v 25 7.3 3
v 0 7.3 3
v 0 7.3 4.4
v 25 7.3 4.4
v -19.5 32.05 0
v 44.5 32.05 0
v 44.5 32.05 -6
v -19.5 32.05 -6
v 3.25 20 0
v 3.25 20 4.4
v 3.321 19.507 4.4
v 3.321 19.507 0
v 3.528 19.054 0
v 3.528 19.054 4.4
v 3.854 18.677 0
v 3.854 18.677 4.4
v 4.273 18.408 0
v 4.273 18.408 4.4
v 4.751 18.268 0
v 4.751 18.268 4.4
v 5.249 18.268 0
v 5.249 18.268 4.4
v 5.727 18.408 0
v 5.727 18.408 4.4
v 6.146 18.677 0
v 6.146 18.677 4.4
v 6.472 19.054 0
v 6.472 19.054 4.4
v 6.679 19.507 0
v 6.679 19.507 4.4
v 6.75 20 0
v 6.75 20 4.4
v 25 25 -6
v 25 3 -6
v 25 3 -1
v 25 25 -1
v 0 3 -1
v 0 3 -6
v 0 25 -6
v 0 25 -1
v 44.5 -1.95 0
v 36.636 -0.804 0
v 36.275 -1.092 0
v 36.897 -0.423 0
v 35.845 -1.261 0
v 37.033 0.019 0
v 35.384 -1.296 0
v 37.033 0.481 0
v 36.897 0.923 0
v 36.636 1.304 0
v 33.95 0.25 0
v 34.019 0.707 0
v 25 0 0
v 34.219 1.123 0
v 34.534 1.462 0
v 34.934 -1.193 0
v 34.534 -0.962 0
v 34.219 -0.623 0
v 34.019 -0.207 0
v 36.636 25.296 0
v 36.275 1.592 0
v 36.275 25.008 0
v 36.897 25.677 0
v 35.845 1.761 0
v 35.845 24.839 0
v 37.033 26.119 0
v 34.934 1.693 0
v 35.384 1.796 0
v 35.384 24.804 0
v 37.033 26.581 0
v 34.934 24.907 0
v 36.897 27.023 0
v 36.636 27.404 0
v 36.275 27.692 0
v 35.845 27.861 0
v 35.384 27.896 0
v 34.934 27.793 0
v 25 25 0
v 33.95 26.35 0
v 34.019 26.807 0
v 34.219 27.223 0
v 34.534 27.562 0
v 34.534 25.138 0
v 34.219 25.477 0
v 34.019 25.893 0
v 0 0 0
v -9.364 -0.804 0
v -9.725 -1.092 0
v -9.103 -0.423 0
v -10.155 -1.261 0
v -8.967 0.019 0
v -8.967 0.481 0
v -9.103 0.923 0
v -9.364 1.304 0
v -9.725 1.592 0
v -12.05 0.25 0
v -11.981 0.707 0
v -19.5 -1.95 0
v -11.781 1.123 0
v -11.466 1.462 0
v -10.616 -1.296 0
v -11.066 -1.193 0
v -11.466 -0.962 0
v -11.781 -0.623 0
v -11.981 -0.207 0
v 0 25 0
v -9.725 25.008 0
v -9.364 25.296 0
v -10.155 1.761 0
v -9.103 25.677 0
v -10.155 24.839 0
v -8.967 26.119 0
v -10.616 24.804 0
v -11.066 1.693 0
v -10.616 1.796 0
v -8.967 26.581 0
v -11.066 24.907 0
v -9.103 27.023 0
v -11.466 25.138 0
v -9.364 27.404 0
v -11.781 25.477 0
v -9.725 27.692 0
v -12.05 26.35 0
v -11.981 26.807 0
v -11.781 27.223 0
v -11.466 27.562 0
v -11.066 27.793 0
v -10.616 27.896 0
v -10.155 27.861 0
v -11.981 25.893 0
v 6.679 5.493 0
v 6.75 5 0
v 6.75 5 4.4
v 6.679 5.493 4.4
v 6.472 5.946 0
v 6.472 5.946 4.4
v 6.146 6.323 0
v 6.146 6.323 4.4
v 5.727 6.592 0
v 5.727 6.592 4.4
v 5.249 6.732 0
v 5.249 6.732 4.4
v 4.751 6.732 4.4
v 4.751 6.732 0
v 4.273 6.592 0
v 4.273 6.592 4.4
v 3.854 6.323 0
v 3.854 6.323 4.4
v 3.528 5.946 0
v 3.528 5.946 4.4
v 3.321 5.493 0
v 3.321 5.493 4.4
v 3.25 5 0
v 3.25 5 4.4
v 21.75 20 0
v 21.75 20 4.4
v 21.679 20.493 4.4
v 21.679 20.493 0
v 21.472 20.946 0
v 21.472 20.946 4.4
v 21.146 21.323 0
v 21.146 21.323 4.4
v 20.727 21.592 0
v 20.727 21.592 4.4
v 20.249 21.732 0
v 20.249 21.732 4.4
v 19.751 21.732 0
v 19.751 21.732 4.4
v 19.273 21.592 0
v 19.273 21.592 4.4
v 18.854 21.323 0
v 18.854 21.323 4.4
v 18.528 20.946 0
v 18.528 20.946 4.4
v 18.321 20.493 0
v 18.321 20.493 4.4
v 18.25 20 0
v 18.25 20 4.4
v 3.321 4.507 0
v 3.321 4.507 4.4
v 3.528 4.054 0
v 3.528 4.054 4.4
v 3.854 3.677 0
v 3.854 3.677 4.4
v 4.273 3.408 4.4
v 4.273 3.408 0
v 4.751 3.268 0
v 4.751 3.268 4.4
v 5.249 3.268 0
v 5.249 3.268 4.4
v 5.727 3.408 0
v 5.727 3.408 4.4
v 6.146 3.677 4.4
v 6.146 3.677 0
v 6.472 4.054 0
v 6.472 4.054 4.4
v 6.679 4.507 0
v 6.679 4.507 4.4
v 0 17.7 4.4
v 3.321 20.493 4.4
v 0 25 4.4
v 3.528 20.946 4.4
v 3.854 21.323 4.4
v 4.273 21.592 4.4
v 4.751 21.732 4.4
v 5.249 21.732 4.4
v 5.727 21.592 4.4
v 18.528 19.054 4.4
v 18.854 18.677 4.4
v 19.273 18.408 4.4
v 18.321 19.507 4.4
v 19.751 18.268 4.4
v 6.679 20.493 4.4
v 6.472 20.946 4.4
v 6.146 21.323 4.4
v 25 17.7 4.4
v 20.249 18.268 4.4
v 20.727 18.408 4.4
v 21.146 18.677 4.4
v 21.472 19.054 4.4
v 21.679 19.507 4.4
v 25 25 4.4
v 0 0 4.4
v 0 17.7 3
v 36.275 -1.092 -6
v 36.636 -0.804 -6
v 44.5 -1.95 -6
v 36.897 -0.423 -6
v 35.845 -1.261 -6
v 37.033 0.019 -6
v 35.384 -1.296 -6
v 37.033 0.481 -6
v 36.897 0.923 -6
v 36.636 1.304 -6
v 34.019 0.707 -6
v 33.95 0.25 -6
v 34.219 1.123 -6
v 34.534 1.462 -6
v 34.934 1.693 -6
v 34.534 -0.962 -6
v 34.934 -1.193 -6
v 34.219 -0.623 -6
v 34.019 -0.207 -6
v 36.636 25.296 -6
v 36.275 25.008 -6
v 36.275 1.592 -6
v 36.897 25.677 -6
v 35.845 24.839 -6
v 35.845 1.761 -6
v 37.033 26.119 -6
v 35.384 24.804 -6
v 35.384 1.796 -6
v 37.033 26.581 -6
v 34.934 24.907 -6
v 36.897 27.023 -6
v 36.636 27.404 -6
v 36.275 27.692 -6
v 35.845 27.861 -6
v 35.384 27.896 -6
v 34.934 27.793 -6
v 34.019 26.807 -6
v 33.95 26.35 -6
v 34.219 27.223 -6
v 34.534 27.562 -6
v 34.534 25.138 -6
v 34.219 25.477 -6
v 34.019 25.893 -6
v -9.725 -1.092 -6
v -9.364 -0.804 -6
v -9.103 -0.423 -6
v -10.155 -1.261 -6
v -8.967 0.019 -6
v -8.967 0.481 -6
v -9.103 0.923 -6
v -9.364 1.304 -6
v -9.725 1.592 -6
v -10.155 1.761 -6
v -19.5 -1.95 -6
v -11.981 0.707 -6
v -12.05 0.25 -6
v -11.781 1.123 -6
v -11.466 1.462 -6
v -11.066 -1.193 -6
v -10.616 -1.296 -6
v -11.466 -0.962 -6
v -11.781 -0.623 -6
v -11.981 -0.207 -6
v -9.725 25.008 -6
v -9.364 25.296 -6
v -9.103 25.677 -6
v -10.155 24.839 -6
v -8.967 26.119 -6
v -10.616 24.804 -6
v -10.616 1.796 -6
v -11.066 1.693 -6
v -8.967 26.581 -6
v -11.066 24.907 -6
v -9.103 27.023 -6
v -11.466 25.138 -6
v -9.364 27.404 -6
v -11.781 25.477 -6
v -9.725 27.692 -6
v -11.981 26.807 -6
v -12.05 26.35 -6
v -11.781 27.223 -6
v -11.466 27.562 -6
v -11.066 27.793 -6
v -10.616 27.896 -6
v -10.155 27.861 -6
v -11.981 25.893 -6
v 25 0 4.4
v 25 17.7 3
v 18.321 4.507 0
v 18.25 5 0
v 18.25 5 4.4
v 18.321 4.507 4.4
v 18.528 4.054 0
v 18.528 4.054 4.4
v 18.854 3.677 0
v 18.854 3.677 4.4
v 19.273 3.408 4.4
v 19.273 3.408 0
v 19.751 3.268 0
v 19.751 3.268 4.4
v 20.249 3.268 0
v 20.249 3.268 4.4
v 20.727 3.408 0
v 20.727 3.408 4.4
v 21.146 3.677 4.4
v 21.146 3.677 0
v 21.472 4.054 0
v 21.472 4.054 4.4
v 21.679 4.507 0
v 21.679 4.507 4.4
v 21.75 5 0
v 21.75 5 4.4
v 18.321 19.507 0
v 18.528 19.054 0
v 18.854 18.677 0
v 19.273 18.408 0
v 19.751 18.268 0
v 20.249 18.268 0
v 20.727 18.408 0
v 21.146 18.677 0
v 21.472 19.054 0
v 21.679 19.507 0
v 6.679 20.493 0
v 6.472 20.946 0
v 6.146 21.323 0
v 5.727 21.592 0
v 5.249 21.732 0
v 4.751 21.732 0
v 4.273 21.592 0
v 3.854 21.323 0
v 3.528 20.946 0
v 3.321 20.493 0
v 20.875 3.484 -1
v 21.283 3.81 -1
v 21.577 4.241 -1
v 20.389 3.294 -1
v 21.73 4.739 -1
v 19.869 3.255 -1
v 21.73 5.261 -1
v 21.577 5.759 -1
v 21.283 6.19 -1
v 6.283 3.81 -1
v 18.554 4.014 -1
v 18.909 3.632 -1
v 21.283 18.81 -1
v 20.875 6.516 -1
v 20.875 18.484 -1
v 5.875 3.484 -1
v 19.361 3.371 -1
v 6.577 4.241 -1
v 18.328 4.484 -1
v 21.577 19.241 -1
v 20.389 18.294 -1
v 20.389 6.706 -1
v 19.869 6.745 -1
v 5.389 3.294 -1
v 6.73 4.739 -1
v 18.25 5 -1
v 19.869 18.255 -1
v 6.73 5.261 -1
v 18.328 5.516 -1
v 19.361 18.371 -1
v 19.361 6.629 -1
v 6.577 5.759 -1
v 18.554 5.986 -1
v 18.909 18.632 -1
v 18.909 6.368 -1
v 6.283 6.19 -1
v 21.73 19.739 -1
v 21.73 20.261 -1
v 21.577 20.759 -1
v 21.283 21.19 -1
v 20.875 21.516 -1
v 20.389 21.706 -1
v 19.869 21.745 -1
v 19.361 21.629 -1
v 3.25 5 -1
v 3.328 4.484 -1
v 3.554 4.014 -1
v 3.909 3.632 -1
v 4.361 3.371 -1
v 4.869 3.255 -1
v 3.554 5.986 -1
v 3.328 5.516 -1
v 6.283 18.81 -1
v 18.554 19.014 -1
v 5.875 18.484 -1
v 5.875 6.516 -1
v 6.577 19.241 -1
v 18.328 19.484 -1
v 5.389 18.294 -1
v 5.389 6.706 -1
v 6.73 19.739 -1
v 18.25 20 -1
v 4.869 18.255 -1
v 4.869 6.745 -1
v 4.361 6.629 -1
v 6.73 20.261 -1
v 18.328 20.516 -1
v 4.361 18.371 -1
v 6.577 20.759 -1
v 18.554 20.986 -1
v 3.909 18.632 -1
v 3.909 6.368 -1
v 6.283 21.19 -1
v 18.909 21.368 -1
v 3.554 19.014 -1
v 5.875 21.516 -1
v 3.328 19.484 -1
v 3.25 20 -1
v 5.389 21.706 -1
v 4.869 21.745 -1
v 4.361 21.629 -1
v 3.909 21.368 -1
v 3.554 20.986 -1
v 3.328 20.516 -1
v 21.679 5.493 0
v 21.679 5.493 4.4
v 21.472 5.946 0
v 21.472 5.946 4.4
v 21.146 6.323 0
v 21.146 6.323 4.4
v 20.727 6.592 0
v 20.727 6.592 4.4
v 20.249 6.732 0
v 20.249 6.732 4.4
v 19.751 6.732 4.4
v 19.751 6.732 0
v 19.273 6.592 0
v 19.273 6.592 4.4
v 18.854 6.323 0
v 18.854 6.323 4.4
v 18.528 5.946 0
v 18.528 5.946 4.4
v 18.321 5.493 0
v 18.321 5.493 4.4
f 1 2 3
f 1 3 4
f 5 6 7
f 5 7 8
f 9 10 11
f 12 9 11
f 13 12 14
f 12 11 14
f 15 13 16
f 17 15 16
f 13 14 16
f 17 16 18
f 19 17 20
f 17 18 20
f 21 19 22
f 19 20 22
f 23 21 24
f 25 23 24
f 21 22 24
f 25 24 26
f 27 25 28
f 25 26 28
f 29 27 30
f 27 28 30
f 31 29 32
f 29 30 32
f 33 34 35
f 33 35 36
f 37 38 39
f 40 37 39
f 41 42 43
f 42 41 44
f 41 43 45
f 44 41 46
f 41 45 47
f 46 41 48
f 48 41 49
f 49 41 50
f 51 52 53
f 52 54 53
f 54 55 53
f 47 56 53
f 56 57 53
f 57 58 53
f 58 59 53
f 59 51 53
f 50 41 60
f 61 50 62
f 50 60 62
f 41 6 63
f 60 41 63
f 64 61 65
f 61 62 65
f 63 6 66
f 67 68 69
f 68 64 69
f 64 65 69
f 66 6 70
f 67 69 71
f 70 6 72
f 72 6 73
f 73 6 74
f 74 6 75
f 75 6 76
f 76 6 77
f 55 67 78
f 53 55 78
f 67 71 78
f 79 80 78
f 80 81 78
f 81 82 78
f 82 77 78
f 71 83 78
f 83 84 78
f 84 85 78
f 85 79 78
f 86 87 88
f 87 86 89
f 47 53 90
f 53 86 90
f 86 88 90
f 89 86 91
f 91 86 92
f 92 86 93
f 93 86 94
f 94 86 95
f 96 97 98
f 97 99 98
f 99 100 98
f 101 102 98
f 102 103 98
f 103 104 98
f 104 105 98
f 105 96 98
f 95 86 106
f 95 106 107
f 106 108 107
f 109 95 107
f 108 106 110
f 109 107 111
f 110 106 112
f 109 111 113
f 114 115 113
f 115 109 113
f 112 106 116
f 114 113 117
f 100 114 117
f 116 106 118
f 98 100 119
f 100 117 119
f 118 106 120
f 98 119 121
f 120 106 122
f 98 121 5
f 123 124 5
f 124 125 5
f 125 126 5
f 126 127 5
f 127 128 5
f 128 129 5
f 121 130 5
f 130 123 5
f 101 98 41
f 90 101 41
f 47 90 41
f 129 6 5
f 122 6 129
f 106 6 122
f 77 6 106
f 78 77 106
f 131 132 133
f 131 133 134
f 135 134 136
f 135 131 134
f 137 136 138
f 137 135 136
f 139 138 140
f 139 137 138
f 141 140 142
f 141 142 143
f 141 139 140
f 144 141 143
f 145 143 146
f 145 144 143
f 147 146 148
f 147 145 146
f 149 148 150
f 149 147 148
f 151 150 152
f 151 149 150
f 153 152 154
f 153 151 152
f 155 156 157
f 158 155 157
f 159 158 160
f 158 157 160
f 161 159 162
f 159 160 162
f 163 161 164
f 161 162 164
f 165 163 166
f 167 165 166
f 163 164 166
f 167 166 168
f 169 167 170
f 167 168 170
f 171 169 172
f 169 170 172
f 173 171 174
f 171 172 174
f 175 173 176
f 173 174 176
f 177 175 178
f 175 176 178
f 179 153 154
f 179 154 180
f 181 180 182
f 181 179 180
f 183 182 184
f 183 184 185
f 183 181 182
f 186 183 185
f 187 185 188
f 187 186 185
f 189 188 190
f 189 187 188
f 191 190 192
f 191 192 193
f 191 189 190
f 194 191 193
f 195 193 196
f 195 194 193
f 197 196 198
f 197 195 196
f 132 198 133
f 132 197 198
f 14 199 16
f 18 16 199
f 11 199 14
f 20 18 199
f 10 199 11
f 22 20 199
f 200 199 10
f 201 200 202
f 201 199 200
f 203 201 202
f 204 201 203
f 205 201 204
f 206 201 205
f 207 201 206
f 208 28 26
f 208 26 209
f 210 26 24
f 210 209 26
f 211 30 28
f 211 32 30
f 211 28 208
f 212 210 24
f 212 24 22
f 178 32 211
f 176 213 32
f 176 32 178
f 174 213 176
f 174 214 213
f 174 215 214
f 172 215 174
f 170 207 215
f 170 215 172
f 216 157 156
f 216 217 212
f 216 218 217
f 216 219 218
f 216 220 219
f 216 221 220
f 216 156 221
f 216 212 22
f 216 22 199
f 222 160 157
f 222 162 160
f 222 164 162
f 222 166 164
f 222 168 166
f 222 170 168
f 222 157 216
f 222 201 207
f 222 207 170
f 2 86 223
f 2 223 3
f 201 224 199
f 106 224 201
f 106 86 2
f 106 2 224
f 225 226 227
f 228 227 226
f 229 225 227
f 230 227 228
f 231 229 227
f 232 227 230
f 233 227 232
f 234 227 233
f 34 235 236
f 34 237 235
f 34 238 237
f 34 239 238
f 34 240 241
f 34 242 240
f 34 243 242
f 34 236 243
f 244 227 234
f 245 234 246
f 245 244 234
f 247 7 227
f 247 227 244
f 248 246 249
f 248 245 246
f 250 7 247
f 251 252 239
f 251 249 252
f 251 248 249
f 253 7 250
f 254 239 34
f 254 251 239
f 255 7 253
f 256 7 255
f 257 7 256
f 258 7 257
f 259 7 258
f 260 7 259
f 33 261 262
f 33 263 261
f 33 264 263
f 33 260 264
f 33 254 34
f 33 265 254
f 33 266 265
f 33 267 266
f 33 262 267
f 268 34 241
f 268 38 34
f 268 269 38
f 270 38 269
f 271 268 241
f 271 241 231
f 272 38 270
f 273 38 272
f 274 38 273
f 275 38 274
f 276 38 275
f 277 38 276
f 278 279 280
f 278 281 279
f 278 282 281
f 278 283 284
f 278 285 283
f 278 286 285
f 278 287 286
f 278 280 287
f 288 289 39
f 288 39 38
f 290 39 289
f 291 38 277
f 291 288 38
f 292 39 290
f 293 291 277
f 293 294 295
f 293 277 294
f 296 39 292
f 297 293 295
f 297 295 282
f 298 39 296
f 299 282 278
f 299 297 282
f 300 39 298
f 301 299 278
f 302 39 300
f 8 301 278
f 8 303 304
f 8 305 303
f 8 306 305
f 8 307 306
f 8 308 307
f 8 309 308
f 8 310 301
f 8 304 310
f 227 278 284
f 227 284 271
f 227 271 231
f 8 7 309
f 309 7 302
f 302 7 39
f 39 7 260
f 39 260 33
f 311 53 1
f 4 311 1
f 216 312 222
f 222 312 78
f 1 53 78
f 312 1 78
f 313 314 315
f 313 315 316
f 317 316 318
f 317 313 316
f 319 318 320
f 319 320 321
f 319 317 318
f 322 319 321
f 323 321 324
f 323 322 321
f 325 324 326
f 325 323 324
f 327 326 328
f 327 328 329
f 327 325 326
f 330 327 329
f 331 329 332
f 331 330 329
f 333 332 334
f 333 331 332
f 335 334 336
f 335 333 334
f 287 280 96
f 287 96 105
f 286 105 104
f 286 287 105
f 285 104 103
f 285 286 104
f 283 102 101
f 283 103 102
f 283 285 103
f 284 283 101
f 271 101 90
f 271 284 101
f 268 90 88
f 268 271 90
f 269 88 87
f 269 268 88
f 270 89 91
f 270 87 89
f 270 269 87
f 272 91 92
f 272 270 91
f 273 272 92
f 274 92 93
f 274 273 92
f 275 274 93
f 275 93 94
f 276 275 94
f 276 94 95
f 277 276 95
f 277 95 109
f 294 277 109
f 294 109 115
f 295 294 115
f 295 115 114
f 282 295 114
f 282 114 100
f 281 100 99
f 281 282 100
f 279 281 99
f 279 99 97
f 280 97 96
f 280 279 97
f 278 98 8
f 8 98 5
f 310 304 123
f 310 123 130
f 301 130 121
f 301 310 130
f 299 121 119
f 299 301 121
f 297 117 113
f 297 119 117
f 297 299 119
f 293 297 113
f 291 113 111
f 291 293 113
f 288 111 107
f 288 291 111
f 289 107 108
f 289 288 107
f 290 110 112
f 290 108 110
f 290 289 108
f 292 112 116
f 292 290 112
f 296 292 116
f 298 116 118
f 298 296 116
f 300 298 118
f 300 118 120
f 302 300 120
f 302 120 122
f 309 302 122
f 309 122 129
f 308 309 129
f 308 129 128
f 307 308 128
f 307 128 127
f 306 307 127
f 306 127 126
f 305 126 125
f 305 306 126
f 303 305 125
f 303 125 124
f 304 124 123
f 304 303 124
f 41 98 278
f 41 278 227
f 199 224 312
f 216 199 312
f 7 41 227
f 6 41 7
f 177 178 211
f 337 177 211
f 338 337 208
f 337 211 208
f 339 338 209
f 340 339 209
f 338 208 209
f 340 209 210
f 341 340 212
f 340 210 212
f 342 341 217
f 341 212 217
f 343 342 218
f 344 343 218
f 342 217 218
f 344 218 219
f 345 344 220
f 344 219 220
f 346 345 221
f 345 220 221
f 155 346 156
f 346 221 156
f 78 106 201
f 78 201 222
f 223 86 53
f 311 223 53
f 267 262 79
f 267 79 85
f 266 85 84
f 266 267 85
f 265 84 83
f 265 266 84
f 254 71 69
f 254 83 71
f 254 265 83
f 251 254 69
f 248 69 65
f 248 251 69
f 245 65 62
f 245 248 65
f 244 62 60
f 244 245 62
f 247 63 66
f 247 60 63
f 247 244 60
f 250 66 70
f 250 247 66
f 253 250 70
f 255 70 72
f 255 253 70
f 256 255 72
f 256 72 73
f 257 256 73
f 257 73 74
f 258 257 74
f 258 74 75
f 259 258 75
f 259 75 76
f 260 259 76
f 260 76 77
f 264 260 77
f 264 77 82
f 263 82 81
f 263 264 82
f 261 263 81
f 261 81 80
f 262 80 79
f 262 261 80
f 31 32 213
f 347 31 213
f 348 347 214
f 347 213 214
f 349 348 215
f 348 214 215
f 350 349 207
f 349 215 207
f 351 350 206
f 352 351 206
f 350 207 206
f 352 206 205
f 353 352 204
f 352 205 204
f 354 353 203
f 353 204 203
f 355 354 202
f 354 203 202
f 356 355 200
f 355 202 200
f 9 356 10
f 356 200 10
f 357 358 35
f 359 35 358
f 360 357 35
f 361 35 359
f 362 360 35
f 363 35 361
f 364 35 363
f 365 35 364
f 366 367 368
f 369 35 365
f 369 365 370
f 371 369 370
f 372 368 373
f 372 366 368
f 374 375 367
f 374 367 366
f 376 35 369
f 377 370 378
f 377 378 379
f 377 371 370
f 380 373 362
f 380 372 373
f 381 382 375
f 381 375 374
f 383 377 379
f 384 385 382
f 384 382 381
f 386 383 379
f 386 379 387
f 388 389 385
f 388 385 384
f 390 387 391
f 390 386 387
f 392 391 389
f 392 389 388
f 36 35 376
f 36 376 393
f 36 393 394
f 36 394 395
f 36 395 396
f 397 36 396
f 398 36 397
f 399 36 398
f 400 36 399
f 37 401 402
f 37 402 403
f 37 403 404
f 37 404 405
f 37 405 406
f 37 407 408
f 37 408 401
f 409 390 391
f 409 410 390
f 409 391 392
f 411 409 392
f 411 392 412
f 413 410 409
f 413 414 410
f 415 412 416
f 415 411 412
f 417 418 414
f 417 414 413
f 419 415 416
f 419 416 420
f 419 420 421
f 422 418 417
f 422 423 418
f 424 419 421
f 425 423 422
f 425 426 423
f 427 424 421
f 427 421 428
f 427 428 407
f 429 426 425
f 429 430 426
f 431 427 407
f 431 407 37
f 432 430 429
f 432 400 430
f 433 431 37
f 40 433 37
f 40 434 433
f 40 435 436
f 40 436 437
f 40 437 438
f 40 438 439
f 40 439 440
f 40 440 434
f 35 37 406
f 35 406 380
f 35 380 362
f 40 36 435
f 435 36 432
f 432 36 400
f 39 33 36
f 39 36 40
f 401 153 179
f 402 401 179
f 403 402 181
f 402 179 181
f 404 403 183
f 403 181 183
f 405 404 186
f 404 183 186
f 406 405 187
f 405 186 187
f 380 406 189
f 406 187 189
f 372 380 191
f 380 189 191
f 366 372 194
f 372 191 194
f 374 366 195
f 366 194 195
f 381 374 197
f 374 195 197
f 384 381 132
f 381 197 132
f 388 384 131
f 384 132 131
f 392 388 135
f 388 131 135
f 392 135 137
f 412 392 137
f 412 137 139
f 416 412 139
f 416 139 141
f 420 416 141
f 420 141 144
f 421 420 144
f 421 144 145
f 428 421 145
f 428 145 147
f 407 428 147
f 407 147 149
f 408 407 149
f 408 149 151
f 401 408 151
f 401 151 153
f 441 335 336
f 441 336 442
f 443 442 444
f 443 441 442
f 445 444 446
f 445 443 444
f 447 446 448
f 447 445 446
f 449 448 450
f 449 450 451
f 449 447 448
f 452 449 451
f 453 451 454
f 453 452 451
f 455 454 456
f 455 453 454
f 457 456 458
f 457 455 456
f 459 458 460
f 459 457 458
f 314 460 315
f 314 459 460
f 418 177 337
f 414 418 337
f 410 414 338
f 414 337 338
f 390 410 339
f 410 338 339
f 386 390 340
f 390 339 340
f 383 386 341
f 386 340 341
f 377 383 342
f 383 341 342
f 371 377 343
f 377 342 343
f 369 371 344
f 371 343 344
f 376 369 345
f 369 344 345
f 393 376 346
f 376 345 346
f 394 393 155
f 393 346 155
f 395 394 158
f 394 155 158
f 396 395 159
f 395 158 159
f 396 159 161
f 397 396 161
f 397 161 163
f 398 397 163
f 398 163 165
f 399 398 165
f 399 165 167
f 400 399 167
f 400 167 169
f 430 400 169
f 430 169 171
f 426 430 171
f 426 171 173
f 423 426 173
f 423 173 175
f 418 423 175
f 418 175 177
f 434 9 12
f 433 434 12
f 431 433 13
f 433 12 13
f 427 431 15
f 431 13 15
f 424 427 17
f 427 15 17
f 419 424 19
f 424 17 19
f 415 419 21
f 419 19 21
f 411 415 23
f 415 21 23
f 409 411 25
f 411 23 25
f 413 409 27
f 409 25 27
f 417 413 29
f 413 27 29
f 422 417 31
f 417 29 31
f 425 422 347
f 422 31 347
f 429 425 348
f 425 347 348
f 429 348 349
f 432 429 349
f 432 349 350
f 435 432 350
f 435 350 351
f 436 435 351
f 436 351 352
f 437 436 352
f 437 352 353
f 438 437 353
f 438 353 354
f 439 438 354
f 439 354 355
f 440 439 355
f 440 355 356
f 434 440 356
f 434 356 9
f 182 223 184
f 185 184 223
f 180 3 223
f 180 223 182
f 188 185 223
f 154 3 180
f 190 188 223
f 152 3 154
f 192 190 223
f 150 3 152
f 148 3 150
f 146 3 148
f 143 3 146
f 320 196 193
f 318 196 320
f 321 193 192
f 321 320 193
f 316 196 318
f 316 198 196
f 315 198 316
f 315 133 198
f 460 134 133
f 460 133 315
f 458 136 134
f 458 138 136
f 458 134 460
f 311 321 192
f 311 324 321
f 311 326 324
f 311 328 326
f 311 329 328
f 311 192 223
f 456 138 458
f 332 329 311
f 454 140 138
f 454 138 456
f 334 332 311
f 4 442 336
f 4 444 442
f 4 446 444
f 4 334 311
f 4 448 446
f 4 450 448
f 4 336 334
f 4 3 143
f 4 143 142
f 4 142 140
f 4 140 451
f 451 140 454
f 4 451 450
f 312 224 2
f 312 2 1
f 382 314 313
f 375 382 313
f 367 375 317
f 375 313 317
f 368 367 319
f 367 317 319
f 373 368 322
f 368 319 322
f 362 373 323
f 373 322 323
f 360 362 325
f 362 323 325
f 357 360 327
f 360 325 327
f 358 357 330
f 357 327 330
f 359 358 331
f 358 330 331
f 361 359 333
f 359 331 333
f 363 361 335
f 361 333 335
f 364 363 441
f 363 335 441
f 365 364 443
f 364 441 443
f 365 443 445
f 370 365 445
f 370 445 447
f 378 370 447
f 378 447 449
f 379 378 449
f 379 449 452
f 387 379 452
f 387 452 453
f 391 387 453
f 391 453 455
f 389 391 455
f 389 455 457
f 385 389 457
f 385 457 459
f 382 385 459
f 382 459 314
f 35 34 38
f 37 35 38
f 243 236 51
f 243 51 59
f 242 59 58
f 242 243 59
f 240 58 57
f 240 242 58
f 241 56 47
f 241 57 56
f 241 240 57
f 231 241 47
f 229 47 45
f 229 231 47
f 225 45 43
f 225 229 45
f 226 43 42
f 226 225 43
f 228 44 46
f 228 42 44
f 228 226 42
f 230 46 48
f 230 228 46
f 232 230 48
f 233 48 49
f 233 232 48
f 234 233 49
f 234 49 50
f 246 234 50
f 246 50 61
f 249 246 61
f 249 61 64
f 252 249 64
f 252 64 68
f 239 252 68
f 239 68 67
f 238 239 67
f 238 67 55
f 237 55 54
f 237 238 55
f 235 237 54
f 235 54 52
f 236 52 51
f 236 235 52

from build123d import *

# Parameters (mm, degrees)
SKETCH_1_W          = 25
SKETCH_1_H          = 25
SKETCH_1_R          = 1.75
EXTRUDE_1_DEPTH     = 3
SKETCH_2_W          = 25
SKETCH_2_H          = 7.3
EXTRUDE_2_DEPTH     = 1.4
SKETCH_3_R          = 1.75
CUT_EXTRUDE_1_DEPTH = 36.628078814
SKETCH_6_W          = 64
SKETCH_6_H          = 36.1
EXTRUDE_5_DEPTH     = 6
SKETCH_7_W          = 25
SKETCH_7_H          = 22
CUT_EXTRUDE_2_DEPTH = 5
SKETCH_3_2_R        = 1.75
CUT_EXTRUDE_5_DEPTH = 56.817671933
SKETCH_9_W          = 64
SKETCH_9_H          = 2.1
CUT_EXTRUDE_6_DEPTH = 10
SKETCH_10_R         = 1.55
CUT_EXTRUDE_7_DEPTH = 57.318779284


with BuildPart() as part:
    # 草图1 → 凸台-拉伸1 (new body)
    with BuildSketch(Plane.XY):
        with Locations((12.5, 12.5)):
            Rectangle(SKETCH_1_W, SKETCH_1_H)
        with Locations((5, 20)):
            Circle(SKETCH_1_R, mode=Mode.SUBTRACT)
        with Locations((20, 20)):
            Circle(SKETCH_1_R, mode=Mode.SUBTRACT)
        with Locations((5, 5)):
            Circle(SKETCH_1_R, mode=Mode.SUBTRACT)
        with Locations((20, 5)):
            Circle(SKETCH_1_R, mode=Mode.SUBTRACT)
    extrude(amount=EXTRUDE_1_DEPTH)

    # 草图2 → 凸台-拉伸2 (add)
    with BuildSketch(Plane.XY.offset(3)):
        with Locations((12.5, 21.35)):
            Rectangle(SKETCH_2_W, SKETCH_2_H)
        with Locations((12.5, 3.65)):
            Rectangle(SKETCH_2_W, SKETCH_2_H)
    extrude(amount=EXTRUDE_2_DEPTH)

    # 草图3 → 切除-拉伸1 (cut, through all)
    with BuildSketch(Plane.XY.offset(4.4)):
        with Locations((5, 5)):
            Circle(SKETCH_3_R)
        with Locations((20, 5)):
            Circle(SKETCH_3_R)
        with Locations((20, 20)):
            Circle(SKETCH_3_R)
        with Locations((5, 20)):
            Circle(SKETCH_3_R)
    extrude(amount=-CUT_EXTRUDE_1_DEPTH, mode=Mode.SUBTRACT)

    # 草图6 → 凸台-拉伸5 (add)
    with BuildSketch(Plane(origin=(0, 0, 0), x_dir=(-1, 0, 0), z_dir=(0, 0, -1))):
        with Locations((-12.5, 14)):
            Rectangle(SKETCH_6_W, SKETCH_6_H)
    extrude(amount=EXTRUDE_5_DEPTH)

    # 草图7 → 切除-拉伸2 (cut)
    with BuildSketch(Plane(origin=(0, 0, -6), x_dir=(-1, 0, 0), z_dir=(0, 0, -1))):
        with Locations((-12.5, 14)):
            Rectangle(SKETCH_7_W, SKETCH_7_H)
    extrude(amount=-CUT_EXTRUDE_2_DEPTH, mode=Mode.SUBTRACT)

    # 草图3<2> → 切除-拉伸5 (cut, through all)
    with BuildSketch(Plane.XY.offset(4.4)):
        with Locations((5, 5)):
            Circle(SKETCH_3_2_R)
        with Locations((20, 5)):
            Circle(SKETCH_3_2_R)
        with Locations((20, 20)):
            Circle(SKETCH_3_2_R)
        with Locations((5, 20)):
            Circle(SKETCH_3_2_R)
    extrude(amount=-CUT_EXTRUDE_5_DEPTH, mode=Mode.SUBTRACT)

    # 草图9 → 切除-拉伸6 (cut)
    with BuildSketch(Plane.XY):
        with Locations((12.5, -3)):
            Rectangle(SKETCH_9_W, SKETCH_9_H)
    extrude(amount=-CUT_EXTRUDE_6_DEPTH, mode=Mode.SUBTRACT)

    # 草图10 → 切除-拉伸7 (cut, through all)
    with BuildSketch(Plane.XY.offset(-8.42)):
        with Locations((-10.5, 26.35)):
            Circle(SKETCH_10_R)
        with Locations((35.5, 26.35)):
            Circle(SKETCH_10_R)
        with Locations((35.5, 0.25)):
            Circle(SKETCH_10_R)
        with Locations((-10.5, 0.25)):
            Circle(SKETCH_10_R)
    extrude(amount=CUT_EXTRUDE_7_DEPTH, mode=Mode.SUBTRACT)


solid = part.part
